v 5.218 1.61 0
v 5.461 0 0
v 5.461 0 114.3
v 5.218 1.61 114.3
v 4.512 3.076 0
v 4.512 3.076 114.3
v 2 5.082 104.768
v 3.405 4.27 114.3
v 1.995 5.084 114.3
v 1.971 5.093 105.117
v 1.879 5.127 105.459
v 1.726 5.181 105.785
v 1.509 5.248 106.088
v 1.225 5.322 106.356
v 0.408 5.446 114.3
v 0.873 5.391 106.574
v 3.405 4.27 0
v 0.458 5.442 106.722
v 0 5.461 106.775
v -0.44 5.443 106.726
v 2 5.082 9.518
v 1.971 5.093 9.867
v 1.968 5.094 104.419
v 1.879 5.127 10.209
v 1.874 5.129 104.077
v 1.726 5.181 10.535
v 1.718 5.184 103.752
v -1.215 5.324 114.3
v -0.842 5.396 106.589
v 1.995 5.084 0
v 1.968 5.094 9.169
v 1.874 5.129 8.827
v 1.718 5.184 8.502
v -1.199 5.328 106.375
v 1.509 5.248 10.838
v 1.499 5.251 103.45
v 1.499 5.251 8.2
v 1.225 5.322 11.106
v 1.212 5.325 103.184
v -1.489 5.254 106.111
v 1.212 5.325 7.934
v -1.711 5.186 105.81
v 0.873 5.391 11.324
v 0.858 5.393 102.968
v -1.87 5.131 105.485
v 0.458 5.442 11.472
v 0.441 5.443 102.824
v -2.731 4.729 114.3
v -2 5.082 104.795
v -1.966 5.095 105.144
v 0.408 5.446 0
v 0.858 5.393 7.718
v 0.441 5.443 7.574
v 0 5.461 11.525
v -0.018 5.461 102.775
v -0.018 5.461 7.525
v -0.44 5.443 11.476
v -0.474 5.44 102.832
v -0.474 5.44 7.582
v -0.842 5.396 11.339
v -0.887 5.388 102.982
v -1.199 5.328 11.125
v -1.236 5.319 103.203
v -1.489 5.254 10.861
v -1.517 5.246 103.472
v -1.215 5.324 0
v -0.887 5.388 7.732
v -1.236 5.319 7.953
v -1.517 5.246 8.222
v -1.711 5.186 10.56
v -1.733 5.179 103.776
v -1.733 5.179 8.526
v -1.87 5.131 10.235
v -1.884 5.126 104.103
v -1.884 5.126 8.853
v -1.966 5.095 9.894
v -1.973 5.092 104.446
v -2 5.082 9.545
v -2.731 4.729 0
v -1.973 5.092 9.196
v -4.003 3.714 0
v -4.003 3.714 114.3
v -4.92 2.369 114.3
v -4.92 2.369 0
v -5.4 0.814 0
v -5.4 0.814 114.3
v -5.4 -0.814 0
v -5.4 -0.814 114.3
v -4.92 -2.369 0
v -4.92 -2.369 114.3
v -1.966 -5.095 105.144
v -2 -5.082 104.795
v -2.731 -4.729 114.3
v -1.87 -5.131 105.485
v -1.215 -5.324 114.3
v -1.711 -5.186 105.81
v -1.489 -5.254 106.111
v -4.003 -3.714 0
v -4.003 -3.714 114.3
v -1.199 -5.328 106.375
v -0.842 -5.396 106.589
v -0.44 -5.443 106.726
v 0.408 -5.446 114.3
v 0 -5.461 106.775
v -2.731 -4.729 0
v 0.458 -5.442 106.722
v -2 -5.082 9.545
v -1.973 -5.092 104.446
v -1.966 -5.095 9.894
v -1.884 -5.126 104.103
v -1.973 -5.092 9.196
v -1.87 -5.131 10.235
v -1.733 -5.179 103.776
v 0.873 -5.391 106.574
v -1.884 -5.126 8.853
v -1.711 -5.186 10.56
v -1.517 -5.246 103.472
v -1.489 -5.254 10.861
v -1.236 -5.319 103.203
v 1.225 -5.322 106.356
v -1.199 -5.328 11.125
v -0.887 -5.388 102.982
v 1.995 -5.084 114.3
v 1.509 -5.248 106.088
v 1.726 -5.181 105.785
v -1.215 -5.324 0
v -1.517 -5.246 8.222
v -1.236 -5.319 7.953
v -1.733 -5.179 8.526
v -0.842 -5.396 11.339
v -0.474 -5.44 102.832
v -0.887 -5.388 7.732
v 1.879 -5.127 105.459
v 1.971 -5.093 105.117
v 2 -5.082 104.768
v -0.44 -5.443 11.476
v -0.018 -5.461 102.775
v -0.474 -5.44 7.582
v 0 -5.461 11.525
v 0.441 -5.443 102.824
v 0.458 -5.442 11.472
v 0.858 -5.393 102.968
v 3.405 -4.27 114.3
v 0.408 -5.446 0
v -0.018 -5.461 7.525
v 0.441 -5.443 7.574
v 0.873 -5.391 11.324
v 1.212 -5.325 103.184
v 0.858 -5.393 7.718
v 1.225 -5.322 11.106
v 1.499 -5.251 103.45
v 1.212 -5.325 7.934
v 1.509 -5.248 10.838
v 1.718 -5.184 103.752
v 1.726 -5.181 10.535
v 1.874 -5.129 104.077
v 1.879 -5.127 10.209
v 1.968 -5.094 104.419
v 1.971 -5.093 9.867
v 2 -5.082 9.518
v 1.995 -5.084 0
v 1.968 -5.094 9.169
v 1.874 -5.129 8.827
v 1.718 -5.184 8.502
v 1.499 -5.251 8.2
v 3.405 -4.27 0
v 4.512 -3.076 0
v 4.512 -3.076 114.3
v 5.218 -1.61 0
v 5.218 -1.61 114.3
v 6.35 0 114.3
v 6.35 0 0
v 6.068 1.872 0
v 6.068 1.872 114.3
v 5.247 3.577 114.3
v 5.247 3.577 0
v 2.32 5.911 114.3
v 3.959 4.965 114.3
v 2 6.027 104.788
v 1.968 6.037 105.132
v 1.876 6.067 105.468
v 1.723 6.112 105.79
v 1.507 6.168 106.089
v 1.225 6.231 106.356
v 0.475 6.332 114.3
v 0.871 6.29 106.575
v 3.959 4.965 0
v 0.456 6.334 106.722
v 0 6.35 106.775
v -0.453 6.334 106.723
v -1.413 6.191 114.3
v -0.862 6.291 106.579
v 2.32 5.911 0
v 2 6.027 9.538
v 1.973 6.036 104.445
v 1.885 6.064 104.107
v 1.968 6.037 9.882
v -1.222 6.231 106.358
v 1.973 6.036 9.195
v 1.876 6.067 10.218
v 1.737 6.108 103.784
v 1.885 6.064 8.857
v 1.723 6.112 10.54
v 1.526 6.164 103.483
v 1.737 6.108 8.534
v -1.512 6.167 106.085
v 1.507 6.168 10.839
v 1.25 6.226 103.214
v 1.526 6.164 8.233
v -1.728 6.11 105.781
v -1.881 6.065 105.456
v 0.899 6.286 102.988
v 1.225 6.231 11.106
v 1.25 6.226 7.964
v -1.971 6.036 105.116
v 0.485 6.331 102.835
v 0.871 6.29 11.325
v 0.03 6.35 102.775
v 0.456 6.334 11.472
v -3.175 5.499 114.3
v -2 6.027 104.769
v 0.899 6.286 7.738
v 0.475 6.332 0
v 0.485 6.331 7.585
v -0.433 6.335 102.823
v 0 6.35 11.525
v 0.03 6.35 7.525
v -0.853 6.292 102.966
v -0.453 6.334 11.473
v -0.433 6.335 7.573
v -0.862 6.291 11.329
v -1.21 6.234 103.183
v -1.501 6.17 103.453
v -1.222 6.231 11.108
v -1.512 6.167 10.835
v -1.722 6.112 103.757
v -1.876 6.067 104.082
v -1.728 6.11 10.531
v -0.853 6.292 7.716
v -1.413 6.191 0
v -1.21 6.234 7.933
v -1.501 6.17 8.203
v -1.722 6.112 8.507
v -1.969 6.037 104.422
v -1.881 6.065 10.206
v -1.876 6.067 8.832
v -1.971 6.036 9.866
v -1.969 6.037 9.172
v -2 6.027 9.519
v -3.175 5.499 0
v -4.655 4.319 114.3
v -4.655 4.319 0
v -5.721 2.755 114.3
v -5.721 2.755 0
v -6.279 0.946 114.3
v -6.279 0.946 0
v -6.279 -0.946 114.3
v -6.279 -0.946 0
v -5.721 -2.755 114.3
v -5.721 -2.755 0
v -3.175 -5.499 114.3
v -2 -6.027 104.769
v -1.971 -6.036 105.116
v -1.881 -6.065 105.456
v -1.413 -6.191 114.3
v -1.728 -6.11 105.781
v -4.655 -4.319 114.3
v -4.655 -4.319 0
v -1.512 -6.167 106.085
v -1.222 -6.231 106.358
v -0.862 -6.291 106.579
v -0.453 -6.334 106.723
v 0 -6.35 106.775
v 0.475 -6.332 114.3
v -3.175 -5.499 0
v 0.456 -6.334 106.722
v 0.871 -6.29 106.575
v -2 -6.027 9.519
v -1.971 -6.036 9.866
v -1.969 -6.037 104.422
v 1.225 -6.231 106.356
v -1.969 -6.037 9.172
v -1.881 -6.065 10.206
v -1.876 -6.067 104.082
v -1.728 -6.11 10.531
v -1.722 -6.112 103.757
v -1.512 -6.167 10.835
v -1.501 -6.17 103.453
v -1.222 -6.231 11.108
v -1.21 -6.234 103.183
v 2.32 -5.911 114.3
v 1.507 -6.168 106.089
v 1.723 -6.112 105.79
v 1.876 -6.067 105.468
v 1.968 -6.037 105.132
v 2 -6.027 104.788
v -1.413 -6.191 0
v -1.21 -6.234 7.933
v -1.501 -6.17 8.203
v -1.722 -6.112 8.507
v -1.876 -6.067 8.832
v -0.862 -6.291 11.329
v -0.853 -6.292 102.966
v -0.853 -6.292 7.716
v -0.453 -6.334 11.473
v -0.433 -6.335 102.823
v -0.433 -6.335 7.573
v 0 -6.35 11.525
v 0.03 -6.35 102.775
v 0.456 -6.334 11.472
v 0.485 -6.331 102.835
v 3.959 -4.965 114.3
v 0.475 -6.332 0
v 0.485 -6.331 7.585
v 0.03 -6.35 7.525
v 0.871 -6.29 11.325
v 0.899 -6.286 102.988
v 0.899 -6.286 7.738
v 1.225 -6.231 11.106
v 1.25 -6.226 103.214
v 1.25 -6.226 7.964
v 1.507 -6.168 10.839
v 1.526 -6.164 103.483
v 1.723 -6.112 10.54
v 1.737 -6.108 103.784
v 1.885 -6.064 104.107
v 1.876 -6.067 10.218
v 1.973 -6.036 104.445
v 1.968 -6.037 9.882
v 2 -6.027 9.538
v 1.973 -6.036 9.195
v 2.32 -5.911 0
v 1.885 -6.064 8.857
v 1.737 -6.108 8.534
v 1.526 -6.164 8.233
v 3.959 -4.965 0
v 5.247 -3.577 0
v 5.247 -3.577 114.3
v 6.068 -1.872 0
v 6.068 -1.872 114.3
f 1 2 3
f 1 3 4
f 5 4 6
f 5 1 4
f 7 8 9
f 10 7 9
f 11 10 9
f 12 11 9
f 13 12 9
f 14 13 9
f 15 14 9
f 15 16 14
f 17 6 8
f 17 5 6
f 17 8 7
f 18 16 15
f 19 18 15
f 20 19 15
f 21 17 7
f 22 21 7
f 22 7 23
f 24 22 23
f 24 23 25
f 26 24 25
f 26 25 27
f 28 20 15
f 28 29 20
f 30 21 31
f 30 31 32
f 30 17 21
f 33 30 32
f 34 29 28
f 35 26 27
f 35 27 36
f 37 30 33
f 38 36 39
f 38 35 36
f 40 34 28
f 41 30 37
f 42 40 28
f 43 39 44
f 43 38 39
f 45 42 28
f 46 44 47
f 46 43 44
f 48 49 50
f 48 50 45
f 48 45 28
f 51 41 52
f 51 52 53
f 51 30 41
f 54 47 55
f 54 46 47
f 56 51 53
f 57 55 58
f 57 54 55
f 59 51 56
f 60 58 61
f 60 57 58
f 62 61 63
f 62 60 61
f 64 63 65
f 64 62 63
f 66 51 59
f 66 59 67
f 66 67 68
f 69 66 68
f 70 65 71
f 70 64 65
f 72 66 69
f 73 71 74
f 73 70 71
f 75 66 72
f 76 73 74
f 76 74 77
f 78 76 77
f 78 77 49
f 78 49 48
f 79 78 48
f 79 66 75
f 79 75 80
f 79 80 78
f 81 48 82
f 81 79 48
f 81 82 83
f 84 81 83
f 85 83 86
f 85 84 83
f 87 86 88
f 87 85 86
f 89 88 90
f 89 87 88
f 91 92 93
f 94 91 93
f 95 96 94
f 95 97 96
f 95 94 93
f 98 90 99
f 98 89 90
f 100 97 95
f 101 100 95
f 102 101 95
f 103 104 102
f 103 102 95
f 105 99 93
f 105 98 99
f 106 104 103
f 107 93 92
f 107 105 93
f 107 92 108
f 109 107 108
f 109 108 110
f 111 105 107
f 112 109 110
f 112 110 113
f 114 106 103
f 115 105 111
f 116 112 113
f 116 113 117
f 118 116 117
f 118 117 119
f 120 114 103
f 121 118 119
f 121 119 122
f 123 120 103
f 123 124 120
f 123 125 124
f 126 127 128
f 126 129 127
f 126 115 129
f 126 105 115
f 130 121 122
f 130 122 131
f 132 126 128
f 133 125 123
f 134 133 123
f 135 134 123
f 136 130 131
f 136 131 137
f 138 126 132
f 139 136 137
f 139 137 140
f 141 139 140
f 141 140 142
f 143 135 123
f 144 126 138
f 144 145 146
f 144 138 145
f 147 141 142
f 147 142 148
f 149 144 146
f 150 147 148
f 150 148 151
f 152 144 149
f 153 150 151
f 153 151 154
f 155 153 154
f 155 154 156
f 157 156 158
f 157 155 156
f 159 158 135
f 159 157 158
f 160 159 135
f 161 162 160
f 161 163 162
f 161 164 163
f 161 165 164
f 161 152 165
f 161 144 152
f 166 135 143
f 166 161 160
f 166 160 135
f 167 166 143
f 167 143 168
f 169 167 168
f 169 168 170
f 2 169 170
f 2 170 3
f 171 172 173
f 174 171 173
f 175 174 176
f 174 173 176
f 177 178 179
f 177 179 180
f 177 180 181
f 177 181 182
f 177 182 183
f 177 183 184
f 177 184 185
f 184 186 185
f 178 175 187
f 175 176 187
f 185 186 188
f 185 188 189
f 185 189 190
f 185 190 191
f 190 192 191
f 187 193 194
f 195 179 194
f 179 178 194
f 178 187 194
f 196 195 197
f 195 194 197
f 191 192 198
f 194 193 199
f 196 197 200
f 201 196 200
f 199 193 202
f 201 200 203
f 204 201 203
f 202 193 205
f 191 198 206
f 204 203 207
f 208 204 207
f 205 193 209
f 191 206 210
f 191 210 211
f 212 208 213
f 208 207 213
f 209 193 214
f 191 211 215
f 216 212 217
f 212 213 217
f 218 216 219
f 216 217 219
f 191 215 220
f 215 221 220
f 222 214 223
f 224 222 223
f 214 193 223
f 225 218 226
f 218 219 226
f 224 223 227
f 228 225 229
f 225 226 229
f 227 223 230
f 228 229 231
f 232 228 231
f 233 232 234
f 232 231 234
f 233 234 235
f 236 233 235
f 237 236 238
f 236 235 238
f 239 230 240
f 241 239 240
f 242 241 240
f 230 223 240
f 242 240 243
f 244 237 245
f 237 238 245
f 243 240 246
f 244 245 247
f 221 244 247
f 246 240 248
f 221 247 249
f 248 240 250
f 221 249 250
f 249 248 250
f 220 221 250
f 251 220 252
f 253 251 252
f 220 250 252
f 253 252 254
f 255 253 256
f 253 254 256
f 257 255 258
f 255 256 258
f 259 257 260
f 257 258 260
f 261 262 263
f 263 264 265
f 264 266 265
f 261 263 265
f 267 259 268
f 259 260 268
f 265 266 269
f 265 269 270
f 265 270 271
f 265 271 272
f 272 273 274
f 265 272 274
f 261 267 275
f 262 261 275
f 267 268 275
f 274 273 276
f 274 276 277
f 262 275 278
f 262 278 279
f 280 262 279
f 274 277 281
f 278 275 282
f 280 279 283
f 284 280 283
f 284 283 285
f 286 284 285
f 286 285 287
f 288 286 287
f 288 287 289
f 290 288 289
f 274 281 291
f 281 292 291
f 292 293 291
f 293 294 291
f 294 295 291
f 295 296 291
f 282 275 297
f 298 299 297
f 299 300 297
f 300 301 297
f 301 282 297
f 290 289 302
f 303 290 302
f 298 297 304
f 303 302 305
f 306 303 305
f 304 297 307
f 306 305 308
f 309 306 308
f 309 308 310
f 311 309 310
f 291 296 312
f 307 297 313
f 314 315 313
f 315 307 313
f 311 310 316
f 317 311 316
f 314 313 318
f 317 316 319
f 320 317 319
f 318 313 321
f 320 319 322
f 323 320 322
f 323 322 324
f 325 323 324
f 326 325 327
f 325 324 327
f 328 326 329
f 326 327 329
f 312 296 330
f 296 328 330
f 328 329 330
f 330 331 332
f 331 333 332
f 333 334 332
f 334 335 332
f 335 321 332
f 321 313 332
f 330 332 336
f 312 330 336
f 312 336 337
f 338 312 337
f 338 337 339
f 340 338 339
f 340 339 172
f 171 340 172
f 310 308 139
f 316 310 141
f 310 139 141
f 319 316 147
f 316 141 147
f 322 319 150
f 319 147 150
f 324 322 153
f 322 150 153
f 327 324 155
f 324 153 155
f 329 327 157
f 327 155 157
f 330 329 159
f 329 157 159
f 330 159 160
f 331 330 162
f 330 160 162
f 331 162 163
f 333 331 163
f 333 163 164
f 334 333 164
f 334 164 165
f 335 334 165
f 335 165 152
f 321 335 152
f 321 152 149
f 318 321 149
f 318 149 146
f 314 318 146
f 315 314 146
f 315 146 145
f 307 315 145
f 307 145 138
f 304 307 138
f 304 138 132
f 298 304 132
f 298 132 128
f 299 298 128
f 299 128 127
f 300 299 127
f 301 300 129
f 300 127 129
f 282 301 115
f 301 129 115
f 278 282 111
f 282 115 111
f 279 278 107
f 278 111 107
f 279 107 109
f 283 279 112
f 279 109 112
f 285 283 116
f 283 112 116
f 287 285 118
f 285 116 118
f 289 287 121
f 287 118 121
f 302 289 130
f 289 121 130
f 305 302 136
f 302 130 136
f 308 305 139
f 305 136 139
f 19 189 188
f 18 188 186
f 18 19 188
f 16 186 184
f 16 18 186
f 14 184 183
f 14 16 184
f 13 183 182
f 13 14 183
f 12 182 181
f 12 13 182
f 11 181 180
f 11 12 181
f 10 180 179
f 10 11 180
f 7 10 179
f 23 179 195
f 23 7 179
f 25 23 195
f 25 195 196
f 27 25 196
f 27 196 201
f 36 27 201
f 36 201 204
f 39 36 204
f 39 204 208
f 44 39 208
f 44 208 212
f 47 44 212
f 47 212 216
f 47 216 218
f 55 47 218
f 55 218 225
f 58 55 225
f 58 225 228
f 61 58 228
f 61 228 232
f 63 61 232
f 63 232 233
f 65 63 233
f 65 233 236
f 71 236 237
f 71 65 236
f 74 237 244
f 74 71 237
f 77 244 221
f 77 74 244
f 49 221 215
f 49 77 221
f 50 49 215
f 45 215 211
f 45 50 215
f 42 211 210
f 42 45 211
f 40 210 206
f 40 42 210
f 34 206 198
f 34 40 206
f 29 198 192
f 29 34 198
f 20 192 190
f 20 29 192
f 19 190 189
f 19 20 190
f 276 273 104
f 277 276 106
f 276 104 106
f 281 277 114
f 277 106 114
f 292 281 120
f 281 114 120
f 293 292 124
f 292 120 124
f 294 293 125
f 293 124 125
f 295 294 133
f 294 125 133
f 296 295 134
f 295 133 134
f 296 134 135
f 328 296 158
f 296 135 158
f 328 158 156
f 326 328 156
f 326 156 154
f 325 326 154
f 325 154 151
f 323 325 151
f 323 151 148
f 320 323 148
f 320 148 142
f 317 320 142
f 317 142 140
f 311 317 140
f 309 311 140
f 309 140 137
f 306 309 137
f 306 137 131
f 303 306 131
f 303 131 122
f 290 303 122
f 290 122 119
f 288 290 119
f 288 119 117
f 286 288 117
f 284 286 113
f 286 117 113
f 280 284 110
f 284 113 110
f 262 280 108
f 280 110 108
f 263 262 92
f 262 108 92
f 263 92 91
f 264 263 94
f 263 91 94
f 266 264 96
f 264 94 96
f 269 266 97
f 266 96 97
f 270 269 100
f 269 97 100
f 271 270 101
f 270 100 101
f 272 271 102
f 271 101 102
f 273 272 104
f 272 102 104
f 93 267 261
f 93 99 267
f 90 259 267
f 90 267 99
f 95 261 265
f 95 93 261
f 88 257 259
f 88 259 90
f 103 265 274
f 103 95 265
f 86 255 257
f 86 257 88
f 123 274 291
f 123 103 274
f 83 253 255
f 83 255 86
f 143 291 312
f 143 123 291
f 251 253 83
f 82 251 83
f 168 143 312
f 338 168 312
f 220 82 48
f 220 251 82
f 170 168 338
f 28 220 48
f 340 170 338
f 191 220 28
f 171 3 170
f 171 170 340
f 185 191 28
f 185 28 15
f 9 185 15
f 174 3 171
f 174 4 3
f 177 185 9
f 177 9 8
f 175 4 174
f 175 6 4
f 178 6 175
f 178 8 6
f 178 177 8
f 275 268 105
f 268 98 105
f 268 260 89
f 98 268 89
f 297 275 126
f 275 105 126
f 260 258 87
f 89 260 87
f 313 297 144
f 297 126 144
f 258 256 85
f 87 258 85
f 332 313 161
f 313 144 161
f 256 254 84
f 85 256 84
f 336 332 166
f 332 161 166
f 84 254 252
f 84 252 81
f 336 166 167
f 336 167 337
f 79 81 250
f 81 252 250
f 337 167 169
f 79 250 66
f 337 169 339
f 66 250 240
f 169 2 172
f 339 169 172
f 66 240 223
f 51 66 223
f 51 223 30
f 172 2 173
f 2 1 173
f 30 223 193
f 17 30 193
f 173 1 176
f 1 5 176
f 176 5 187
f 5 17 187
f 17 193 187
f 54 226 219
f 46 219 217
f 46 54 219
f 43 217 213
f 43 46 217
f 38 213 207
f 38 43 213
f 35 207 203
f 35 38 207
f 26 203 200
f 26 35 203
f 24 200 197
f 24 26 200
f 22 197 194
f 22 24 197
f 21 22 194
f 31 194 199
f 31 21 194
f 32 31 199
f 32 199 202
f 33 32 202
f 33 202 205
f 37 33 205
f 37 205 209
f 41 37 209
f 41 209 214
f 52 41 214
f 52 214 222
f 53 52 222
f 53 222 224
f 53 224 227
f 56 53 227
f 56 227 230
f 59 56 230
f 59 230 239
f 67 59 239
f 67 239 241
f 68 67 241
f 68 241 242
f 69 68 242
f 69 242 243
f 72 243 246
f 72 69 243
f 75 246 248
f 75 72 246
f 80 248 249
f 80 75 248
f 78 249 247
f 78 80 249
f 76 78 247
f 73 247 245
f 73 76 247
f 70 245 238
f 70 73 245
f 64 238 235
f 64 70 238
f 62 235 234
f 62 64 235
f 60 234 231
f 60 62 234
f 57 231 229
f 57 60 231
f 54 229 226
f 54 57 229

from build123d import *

# Parameters (mm, degrees)
SKETCH1_R               = 6.35
SKETCH1_R_2             = 5.461
EXTRUDE1_DEPTH          = 114.3
SKETCH2_R               = 2
CUT_EXTRUDE1_DEPTH      = 38.1
CUT_EXTRUDE1_DEPTH_BACK = 38.1


with BuildPart() as part:
    # Sketch1 → Extrude1 (new body)
    with BuildSketch(Plane.XY):
        Circle(SKETCH1_R)
        Circle(SKETCH1_R_2, mode=Mode.SUBTRACT)
    extrude(amount=EXTRUDE1_DEPTH)

    # Sketch2 → Cut-Extrude1 (cut, two sides)
    with BuildSketch(Plane(origin=(0, 0, 0), x_dir=(1, 0, 0), z_dir=(0, 1, 0))) as cut_extrude1_sk:
        with Locations(Location((0, -9.525, 0), (0, 0, 270))):  # turned: the seam where the file's is
            Circle(SKETCH2_R)
        with Locations(Location((0, -104.775, 0), (0, 0, 270))):  # turned: the seam where the file's is
            Circle(SKETCH2_R)
    extrude(amount=CUT_EXTRUDE1_DEPTH, mode=Mode.SUBTRACT)
    extrude(cut_extrude1_sk.sketch, amount=-CUT_EXTRUDE1_DEPTH_BACK, mode=Mode.SUBTRACT)


solid = part.part
